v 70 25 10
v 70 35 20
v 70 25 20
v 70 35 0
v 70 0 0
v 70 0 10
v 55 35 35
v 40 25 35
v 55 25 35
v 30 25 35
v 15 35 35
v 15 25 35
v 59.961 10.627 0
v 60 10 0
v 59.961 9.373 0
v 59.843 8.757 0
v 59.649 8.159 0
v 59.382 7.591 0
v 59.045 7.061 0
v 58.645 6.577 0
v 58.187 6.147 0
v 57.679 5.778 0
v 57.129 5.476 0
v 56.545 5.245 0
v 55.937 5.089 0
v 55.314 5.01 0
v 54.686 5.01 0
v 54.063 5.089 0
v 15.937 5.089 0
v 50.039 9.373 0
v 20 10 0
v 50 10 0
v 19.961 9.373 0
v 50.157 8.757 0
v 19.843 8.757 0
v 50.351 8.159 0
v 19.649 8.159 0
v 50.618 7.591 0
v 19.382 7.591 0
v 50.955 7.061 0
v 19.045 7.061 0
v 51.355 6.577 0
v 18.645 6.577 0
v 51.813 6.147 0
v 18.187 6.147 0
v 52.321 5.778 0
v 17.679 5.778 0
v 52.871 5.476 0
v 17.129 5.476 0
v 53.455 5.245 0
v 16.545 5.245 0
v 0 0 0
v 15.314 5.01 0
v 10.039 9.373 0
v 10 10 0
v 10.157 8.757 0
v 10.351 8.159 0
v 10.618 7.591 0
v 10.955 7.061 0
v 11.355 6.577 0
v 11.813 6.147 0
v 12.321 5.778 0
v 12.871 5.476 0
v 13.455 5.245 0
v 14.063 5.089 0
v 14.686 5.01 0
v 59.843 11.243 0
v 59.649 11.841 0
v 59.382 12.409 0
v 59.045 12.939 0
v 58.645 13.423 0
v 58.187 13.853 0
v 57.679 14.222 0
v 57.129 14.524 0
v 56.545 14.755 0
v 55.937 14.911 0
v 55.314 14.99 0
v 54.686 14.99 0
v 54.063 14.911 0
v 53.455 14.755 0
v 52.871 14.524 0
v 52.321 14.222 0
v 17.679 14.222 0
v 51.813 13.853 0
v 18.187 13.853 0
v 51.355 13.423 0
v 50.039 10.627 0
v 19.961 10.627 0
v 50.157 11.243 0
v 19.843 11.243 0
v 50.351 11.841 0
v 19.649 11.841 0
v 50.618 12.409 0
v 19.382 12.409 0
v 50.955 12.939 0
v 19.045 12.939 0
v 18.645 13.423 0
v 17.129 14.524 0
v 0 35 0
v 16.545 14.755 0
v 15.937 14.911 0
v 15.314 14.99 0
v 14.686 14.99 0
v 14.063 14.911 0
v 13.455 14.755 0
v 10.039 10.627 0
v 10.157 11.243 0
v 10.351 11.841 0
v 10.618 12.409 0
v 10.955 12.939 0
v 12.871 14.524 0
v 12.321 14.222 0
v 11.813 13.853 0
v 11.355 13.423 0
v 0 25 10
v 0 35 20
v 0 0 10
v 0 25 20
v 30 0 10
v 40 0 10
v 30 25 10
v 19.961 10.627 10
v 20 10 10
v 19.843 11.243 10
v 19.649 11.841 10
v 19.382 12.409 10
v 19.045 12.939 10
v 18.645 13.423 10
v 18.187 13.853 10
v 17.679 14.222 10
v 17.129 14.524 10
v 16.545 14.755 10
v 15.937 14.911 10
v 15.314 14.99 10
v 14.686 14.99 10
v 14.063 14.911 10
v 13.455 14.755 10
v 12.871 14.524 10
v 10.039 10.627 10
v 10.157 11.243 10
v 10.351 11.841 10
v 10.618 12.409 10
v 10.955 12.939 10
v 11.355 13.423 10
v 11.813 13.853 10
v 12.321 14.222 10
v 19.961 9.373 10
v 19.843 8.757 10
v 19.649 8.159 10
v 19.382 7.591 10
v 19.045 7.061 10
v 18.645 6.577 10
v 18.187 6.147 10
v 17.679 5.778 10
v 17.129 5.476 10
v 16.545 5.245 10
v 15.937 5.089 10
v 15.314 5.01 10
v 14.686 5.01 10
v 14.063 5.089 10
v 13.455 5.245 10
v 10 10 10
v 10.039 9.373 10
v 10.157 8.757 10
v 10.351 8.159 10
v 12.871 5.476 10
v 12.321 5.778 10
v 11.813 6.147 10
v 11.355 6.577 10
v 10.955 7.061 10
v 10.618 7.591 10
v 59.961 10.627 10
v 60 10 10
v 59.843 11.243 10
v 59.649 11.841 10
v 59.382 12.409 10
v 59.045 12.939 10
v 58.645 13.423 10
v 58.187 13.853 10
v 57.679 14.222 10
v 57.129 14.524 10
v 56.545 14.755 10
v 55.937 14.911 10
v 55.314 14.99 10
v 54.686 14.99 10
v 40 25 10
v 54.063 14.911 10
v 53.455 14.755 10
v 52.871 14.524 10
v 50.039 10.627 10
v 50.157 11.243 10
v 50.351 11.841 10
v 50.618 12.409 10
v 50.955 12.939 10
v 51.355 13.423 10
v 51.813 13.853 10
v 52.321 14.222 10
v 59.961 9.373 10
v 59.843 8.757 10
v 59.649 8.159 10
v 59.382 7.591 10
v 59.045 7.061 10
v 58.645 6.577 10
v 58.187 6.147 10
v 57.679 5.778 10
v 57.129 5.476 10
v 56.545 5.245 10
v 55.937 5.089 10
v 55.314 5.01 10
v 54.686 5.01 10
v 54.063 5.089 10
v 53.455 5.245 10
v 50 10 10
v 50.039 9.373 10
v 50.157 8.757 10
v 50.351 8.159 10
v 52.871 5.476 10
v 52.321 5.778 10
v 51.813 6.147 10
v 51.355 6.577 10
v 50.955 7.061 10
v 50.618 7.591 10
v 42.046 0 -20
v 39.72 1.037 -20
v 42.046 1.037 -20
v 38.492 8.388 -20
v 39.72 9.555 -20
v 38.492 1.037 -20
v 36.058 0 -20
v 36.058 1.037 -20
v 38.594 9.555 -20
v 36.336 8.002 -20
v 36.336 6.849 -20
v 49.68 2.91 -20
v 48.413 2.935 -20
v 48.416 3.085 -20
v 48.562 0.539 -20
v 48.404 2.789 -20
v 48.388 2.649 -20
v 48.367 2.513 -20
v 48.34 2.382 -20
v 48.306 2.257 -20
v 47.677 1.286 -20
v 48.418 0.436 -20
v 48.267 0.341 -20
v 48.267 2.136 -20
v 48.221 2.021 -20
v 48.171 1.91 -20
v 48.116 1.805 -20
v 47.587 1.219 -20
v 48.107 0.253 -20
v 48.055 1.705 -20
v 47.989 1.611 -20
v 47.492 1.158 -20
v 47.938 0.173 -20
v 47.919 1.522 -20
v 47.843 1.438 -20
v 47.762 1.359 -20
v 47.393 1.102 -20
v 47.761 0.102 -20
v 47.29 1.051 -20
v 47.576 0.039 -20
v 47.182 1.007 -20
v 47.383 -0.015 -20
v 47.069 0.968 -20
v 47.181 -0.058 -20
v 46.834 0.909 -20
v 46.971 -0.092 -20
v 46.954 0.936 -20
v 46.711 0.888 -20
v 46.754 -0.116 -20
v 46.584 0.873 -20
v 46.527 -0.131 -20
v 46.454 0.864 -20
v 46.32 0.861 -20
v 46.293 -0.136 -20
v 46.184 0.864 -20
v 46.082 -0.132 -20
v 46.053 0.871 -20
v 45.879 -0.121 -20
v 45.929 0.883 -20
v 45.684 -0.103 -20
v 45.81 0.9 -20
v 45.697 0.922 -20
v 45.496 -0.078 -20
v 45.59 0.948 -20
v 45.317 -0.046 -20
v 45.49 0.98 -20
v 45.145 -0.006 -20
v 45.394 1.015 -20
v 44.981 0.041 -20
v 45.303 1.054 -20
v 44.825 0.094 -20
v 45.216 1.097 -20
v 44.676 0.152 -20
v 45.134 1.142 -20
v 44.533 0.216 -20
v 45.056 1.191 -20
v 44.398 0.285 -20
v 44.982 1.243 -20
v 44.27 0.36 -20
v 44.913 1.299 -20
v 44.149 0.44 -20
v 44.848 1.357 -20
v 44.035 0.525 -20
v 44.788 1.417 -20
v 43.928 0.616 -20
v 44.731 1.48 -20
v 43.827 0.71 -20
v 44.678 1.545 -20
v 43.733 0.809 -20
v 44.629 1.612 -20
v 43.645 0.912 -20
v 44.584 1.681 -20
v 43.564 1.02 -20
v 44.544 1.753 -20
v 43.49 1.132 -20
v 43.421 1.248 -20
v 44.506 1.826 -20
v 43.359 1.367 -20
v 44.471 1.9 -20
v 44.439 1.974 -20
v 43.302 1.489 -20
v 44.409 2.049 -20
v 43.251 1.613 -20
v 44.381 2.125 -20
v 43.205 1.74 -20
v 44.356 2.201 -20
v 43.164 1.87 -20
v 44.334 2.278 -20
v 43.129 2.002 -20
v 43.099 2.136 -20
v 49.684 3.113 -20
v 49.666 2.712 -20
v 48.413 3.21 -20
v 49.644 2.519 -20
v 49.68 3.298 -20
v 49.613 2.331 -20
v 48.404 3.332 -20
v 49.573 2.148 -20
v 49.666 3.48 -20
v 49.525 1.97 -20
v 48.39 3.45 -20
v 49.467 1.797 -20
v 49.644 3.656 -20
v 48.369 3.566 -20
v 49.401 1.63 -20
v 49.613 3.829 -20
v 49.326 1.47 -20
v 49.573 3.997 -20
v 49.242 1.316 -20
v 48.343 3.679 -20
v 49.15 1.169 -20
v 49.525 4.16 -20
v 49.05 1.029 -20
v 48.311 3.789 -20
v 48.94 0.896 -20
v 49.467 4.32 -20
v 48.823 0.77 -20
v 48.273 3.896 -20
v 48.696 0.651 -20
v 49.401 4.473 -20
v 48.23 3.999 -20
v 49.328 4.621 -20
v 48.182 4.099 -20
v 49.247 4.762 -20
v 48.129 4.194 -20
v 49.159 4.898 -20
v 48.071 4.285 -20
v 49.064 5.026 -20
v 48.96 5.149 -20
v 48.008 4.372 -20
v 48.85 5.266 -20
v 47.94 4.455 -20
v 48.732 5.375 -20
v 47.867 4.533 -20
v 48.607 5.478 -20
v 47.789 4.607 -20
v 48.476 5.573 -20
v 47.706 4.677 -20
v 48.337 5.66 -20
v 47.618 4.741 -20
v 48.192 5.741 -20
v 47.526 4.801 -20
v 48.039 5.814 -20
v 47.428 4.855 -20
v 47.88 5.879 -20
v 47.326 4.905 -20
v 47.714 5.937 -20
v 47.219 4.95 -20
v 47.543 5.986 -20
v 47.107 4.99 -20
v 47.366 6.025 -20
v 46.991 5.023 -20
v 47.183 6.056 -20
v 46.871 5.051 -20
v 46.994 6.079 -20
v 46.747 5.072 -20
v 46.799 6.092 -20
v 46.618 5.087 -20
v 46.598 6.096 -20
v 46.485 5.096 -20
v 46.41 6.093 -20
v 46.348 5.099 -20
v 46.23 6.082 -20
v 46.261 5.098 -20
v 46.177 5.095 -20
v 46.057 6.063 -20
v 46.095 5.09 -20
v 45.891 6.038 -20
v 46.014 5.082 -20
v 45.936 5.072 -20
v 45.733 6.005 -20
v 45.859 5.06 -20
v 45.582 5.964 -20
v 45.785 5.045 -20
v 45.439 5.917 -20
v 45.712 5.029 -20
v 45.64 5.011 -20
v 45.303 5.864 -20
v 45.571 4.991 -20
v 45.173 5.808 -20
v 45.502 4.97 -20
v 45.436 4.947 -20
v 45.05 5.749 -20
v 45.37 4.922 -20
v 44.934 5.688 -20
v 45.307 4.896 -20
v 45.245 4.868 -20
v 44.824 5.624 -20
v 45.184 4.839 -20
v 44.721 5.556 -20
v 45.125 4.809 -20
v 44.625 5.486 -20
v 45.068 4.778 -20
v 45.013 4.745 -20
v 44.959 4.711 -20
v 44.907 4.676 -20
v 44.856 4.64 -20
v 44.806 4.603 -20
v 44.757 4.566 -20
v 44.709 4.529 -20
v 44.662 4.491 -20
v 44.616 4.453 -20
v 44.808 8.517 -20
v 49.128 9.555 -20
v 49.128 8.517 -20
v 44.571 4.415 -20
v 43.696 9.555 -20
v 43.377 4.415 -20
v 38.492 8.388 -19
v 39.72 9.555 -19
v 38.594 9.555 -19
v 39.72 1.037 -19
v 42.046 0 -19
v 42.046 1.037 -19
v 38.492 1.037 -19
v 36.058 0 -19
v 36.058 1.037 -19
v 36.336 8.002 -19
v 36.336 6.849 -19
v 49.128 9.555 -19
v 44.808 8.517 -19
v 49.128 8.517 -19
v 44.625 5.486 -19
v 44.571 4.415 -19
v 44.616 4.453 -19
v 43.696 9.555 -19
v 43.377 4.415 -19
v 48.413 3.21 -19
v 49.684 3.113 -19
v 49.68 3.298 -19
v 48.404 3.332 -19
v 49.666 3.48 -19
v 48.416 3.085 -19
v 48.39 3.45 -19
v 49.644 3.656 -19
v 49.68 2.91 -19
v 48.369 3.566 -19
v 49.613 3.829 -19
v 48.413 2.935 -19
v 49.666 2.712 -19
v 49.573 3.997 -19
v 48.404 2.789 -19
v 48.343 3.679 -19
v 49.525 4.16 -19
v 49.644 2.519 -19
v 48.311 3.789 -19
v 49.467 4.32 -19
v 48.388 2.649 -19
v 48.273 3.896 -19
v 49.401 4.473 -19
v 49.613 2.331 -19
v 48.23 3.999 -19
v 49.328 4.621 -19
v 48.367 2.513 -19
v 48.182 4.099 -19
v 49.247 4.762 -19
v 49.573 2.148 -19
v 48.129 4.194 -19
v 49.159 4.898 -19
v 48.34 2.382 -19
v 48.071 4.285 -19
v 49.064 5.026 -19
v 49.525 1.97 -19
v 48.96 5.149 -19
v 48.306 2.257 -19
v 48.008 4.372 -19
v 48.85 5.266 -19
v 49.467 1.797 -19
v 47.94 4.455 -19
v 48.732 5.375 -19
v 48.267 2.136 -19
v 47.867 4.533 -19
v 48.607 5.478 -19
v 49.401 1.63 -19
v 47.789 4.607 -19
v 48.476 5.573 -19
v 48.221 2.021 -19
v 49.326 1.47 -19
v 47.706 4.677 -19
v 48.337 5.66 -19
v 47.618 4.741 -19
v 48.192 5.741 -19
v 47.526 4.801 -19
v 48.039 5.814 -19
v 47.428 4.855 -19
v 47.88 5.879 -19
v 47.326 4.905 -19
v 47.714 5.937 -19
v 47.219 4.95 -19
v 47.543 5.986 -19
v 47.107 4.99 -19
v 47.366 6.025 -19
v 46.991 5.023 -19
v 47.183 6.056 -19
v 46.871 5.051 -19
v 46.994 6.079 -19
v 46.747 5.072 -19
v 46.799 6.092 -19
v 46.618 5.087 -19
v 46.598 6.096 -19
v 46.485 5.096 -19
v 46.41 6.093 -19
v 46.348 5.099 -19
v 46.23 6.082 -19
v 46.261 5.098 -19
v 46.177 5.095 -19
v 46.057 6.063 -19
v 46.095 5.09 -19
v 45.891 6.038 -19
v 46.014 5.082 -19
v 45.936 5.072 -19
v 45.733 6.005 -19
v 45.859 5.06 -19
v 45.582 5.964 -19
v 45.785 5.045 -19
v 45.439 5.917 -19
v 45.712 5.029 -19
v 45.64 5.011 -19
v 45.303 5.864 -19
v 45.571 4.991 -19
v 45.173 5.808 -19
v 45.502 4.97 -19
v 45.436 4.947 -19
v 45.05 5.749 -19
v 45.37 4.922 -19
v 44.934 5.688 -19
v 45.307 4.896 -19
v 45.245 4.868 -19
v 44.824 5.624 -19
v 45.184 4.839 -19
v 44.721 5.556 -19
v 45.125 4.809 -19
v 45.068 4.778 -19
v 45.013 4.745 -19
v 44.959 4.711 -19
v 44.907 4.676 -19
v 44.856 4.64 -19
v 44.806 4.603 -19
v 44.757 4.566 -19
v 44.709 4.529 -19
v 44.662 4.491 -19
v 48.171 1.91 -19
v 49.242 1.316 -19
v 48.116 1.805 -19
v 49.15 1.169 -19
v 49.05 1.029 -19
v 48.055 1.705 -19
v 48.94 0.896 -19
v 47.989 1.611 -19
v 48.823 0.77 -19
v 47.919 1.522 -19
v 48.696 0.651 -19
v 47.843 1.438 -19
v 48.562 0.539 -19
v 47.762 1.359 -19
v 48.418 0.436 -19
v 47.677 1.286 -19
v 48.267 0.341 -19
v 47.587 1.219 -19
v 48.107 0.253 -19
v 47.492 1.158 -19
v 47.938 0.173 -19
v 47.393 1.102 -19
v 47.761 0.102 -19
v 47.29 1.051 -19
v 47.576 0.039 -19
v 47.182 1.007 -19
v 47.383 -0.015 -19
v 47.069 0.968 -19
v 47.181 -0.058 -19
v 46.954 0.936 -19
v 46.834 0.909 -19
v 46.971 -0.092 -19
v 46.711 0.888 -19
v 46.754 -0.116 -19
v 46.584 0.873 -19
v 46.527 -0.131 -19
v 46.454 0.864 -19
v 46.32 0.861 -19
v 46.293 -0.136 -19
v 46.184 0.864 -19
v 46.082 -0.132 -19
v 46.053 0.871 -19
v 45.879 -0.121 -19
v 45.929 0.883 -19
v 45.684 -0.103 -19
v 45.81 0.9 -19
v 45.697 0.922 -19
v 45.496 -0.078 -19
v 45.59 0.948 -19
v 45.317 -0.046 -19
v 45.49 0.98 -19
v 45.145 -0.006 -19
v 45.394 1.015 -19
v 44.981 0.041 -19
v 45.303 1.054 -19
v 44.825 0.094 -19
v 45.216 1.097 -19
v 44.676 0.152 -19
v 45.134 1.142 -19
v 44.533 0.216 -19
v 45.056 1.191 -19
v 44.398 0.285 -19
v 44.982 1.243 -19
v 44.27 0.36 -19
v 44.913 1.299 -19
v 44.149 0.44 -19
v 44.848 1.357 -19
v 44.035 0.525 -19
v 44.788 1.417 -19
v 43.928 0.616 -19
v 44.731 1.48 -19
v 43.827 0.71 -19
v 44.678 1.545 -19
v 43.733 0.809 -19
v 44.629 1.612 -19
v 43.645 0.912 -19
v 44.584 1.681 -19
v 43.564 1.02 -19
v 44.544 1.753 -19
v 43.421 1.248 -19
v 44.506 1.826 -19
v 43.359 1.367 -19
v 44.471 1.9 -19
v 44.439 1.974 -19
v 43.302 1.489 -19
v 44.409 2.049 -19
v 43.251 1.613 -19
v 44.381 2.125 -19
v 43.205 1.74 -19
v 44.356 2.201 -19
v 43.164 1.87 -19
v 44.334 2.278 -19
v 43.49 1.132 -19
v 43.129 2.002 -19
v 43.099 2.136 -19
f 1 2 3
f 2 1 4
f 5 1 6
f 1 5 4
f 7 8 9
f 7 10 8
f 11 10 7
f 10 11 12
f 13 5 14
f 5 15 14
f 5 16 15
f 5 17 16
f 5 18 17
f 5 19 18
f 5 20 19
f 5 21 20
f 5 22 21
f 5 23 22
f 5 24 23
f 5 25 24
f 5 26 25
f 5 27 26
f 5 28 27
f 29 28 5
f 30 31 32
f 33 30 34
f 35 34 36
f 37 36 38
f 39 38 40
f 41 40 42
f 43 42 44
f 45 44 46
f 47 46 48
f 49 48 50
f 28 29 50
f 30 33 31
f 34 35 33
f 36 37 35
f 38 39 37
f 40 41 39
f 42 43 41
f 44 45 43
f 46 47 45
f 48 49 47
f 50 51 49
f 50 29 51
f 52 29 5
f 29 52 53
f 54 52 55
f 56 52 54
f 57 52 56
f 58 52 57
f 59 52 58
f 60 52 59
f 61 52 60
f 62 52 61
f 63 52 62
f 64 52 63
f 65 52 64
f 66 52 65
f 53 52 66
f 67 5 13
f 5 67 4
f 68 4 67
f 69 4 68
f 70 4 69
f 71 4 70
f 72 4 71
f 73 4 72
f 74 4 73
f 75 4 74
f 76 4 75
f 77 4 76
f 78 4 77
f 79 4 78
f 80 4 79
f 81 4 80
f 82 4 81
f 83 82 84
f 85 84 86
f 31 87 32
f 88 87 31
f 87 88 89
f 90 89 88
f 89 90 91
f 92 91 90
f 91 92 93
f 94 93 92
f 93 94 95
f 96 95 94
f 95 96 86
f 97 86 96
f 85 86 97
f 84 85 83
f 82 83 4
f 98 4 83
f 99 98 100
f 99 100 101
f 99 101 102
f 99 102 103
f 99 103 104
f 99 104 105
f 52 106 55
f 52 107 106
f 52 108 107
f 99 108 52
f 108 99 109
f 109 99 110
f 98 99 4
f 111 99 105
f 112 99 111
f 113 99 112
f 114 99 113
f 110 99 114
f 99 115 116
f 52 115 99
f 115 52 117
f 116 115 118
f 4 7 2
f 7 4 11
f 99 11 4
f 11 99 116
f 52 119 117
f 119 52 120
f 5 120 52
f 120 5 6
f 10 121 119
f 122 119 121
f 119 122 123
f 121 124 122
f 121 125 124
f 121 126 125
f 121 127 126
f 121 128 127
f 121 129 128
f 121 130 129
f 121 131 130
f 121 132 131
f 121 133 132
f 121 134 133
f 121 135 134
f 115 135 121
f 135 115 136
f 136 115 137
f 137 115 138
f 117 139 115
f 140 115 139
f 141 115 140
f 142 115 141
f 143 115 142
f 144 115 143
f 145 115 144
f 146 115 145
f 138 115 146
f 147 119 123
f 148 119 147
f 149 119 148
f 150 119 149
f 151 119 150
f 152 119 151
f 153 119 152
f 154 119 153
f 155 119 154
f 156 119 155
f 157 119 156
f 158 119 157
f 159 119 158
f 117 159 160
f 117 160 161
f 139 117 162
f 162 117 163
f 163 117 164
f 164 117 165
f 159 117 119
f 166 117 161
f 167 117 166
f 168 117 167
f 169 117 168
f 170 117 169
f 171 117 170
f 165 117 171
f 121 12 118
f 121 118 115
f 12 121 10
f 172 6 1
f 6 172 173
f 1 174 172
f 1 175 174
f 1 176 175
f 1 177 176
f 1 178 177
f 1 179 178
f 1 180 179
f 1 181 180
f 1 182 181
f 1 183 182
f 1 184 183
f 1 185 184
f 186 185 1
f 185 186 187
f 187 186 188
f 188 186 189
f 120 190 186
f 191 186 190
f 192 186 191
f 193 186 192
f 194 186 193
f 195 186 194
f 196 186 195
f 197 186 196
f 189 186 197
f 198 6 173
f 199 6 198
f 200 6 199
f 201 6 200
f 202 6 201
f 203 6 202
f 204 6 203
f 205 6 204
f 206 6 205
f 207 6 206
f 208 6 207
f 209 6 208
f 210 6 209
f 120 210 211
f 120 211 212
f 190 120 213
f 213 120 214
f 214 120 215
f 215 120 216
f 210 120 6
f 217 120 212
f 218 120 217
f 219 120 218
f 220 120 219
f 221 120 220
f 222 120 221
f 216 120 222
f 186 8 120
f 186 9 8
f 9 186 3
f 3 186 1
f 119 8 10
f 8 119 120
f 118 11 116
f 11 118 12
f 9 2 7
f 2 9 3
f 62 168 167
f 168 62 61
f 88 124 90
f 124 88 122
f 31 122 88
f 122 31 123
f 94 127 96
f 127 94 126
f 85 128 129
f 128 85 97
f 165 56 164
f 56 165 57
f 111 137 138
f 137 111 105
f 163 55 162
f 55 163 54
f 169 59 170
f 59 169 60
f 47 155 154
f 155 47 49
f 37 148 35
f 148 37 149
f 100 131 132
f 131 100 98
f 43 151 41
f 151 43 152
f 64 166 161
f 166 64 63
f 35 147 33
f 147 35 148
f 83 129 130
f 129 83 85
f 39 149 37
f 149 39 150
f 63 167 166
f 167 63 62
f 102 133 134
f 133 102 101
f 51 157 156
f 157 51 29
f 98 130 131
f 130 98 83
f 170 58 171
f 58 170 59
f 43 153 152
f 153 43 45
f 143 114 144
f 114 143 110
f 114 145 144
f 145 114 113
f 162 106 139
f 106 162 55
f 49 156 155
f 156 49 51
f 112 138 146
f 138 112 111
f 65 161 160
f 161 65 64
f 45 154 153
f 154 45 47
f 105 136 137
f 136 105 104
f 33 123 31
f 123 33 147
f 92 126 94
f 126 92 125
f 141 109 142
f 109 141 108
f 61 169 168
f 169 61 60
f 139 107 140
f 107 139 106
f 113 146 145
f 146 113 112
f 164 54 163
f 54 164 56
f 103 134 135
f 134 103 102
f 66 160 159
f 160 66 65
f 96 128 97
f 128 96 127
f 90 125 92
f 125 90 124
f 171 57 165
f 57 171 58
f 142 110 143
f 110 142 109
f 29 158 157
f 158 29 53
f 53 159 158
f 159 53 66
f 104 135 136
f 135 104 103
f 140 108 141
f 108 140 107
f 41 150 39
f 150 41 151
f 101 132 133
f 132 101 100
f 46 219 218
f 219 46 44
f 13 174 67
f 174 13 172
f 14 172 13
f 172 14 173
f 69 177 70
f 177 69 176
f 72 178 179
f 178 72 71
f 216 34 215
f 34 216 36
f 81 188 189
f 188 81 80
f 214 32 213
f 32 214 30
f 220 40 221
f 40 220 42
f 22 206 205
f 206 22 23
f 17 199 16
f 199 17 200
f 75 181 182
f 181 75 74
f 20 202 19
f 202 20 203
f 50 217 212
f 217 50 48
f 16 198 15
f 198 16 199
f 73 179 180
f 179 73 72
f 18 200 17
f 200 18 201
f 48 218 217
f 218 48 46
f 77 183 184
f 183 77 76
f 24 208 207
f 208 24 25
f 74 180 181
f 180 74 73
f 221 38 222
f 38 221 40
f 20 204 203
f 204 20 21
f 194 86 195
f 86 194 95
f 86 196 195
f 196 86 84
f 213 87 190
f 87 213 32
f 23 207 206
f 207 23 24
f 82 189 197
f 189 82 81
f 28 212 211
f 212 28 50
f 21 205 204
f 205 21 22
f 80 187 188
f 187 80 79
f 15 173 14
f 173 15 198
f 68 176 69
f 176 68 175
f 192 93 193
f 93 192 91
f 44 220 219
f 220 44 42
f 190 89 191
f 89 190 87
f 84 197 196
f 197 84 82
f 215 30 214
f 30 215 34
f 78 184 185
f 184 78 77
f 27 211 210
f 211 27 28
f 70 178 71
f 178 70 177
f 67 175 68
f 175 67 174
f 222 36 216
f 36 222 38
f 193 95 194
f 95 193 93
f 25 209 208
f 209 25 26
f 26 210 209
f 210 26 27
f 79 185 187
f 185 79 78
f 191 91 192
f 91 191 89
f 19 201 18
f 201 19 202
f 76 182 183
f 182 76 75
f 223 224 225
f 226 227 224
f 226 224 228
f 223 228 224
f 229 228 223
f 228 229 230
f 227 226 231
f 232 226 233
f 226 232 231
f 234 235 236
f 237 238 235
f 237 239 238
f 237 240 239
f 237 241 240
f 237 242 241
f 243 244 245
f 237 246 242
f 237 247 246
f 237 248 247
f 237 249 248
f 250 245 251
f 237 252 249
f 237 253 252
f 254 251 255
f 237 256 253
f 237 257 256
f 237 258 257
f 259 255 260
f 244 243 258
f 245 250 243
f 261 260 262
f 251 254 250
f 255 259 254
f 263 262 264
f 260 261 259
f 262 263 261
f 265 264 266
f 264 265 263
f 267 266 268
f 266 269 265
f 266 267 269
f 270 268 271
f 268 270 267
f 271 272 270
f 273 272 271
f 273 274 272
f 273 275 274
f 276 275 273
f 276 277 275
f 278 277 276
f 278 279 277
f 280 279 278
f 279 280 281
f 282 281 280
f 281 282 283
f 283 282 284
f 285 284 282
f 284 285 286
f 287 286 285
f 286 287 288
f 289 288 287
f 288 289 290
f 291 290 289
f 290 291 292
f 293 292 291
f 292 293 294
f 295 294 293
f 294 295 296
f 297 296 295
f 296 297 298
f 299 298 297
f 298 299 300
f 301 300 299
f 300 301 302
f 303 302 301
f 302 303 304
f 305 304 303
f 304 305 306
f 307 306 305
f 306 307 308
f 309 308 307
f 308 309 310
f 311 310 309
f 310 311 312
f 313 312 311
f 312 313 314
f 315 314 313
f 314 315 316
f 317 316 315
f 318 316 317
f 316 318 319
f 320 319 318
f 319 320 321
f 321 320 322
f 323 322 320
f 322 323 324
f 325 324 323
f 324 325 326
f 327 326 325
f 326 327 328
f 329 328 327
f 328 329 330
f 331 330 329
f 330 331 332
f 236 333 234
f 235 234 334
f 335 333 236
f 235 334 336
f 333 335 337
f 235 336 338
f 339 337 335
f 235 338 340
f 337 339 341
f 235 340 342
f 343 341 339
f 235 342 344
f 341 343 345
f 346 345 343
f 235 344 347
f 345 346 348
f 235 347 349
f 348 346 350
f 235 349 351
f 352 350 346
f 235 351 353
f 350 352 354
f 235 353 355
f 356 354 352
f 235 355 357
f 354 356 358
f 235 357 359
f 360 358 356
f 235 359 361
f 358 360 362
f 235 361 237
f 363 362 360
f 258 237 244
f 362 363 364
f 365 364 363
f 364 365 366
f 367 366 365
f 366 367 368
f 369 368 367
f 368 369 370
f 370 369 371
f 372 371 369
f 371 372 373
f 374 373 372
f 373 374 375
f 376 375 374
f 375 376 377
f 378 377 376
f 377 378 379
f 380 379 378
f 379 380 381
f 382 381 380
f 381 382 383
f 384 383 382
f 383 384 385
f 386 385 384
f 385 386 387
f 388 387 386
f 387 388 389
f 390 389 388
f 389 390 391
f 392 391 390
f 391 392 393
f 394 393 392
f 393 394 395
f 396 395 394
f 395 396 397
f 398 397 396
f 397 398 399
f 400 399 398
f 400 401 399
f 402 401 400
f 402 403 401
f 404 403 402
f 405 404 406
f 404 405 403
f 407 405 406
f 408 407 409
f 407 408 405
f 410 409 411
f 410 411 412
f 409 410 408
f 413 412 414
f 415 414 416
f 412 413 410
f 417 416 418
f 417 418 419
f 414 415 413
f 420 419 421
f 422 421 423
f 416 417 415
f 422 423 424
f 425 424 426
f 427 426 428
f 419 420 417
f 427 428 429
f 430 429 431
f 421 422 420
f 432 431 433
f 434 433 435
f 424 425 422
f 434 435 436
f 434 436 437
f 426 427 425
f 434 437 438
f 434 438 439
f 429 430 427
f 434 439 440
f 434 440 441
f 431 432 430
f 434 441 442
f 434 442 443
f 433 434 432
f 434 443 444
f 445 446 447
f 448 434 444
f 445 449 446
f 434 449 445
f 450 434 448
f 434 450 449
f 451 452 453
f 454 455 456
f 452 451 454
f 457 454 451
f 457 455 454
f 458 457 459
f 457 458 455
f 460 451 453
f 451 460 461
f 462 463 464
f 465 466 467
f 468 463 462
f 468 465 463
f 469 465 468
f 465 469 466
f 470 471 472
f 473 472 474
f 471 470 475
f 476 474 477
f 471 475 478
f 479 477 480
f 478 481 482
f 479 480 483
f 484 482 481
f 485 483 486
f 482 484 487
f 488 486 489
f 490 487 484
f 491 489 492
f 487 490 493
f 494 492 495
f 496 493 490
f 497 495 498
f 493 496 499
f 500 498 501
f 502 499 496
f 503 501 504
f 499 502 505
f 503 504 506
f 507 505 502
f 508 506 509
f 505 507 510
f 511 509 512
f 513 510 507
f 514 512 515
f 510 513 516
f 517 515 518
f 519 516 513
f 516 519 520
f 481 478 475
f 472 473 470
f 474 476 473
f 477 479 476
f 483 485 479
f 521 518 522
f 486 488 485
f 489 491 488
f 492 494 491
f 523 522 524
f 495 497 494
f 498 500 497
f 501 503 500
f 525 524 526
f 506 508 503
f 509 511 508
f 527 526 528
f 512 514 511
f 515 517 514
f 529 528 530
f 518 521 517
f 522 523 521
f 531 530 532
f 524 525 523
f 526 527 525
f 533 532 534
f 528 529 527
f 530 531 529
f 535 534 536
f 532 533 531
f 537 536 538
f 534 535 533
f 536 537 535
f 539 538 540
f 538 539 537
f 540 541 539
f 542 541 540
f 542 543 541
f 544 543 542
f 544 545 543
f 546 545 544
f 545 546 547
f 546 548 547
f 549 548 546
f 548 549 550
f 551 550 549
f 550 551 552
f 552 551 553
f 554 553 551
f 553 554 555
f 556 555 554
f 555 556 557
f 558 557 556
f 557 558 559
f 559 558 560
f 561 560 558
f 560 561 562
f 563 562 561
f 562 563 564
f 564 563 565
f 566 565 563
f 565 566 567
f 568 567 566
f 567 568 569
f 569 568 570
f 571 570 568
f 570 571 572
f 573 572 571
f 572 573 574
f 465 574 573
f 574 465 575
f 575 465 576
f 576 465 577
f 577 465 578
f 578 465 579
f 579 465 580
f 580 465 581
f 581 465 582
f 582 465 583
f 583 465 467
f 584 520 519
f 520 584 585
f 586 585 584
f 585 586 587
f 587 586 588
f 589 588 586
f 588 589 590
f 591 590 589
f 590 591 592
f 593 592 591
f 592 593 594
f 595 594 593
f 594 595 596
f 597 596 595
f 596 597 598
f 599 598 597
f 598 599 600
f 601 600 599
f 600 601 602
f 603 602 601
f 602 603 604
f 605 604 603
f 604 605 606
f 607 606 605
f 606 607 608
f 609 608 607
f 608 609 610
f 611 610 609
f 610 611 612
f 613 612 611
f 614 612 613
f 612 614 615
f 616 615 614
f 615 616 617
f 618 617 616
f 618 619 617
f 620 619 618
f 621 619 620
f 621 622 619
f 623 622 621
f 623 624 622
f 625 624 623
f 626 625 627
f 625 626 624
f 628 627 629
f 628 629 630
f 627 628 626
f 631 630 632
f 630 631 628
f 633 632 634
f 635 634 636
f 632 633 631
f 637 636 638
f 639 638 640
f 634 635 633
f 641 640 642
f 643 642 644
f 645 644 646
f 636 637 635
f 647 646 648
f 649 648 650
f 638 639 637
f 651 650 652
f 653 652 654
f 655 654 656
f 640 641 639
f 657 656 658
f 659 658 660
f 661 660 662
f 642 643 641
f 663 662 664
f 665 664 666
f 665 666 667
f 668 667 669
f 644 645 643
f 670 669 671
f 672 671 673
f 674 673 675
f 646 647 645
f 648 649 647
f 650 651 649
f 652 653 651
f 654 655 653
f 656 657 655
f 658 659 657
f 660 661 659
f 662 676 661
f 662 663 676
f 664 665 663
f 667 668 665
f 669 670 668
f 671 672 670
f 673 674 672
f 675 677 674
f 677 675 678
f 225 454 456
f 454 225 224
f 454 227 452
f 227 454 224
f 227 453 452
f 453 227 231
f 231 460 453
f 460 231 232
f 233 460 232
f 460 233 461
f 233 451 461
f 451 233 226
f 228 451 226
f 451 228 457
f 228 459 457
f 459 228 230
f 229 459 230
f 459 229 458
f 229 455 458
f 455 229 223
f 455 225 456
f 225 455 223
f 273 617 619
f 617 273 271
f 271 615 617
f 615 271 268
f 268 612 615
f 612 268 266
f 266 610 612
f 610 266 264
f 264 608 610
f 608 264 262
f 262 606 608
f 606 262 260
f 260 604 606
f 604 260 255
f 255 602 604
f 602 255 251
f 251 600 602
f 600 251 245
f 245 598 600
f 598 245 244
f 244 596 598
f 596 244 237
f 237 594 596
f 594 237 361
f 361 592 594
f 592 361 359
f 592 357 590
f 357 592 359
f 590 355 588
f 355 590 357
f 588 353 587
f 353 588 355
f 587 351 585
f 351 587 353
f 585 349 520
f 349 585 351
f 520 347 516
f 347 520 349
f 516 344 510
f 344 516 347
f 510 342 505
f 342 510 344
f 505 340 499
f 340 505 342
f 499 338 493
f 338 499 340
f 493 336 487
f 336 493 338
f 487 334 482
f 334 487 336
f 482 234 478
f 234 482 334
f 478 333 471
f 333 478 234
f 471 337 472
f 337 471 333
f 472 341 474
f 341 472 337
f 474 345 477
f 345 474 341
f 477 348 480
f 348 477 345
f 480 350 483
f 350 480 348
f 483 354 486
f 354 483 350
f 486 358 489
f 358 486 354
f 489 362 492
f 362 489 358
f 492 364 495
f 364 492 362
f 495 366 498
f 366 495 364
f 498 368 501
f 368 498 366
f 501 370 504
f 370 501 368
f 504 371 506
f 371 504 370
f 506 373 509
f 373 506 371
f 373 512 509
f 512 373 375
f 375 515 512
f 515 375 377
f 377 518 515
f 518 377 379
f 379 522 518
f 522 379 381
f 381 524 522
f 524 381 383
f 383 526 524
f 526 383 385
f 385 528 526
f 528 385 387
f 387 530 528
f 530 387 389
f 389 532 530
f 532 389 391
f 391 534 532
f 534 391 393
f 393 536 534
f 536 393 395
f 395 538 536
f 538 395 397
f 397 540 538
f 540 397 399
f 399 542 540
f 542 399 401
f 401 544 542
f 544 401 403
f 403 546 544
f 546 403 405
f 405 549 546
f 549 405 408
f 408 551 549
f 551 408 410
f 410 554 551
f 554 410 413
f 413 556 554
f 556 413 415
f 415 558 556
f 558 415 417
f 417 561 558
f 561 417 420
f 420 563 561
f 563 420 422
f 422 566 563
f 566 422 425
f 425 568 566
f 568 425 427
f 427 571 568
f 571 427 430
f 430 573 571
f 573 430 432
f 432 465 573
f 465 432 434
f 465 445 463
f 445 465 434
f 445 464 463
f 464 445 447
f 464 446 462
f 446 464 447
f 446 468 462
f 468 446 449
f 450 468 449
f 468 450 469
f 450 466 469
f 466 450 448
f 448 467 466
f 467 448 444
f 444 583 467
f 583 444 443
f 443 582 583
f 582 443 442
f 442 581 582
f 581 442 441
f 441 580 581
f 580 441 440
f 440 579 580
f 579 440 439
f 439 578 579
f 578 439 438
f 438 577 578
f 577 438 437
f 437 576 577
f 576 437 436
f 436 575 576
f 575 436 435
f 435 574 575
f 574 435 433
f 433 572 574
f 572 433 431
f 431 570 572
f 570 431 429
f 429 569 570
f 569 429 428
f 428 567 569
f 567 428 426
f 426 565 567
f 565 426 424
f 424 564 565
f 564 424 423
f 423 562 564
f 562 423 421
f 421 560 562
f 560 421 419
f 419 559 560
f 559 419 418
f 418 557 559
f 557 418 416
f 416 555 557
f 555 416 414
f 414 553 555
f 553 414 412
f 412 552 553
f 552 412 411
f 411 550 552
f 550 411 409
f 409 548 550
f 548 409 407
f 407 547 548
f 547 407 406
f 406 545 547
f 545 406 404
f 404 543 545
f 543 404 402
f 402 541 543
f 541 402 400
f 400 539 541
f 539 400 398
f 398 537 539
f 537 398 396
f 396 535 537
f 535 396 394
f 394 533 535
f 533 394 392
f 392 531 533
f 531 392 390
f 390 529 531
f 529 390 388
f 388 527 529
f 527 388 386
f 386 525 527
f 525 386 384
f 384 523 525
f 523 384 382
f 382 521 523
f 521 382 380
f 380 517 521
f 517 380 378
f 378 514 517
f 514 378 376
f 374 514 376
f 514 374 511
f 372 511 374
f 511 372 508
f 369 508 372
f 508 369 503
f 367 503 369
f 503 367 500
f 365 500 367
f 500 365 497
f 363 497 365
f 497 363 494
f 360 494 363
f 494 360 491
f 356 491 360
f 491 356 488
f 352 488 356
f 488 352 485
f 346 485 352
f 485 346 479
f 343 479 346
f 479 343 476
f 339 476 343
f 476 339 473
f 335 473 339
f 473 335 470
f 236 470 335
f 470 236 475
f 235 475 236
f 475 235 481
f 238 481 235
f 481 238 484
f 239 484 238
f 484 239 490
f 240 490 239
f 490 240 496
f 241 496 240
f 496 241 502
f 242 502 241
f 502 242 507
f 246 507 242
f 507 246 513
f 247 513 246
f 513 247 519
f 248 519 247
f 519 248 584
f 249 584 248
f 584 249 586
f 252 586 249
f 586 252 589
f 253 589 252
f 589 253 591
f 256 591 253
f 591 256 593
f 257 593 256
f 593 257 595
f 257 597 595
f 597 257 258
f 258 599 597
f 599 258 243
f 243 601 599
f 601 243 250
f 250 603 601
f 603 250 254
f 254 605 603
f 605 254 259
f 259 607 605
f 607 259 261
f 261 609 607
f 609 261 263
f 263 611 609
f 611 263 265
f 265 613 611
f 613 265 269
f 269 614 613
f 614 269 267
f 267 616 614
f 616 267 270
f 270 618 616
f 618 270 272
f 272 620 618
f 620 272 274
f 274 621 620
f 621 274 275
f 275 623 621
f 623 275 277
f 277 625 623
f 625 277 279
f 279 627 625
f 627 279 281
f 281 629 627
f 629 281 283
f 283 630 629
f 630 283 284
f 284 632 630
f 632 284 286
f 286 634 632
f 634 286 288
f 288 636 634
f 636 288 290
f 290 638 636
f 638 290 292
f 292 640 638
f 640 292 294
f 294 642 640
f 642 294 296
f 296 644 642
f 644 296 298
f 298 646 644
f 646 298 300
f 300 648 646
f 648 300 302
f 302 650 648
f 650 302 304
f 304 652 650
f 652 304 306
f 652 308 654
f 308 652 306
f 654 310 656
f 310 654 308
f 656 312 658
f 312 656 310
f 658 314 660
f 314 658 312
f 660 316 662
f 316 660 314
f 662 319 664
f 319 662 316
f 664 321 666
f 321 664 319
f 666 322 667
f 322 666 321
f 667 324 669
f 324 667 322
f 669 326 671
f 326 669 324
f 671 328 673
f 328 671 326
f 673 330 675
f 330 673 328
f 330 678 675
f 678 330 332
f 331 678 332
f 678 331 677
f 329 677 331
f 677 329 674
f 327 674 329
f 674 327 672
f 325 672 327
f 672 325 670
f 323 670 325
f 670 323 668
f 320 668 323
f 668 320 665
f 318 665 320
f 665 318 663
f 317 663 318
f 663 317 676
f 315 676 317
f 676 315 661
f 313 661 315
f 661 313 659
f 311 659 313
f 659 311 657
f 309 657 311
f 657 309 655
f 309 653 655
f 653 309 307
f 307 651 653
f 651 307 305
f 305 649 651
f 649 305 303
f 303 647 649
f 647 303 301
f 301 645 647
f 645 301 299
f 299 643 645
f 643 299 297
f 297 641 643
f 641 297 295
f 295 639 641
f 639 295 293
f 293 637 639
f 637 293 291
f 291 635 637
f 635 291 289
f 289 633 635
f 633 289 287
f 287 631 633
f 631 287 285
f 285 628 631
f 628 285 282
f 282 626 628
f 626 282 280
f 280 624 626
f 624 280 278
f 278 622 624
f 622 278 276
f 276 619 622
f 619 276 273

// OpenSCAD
$fn=50;

cw=70;
cd=35;
ch=35;
cy=10;

difference() {
    cube([cw,cd,ch]);
    translate([0,0,10])
    cube([30,cd-10,ch-10]);
    translate([(cw/2)+5,0,10])
    cube([30,cd-10,ch-10]);
    rotate([90,0,90])
    linear_extrude(height=cw)
    polygon([[0,10],
             [0,ch],
             [cd-10,ch]]);
    translate([cw,0,0])
    mirror([1,0,0])
    translate([cw-15,cd,ch-15])
    rotate([90,0,0])
    linear_extrude(height=cd)
    polygon([[0,15],
             [15,0],
             [15,15]]);
    translate([cw-15,cd,ch-15])
    rotate([90,0,0])
    linear_extrude(height=cd)
    polygon([[0,15],
             [15,0],
             [15,15]]);
    translate([15,10,0])
    cylinder(h=cy,d=cy);
    translate([cw-15,10,0])
    cylinder(h=cy,d=cy);
}

translate([cw/2,0,-20])
linear_extrude(height=1)
text("15");
